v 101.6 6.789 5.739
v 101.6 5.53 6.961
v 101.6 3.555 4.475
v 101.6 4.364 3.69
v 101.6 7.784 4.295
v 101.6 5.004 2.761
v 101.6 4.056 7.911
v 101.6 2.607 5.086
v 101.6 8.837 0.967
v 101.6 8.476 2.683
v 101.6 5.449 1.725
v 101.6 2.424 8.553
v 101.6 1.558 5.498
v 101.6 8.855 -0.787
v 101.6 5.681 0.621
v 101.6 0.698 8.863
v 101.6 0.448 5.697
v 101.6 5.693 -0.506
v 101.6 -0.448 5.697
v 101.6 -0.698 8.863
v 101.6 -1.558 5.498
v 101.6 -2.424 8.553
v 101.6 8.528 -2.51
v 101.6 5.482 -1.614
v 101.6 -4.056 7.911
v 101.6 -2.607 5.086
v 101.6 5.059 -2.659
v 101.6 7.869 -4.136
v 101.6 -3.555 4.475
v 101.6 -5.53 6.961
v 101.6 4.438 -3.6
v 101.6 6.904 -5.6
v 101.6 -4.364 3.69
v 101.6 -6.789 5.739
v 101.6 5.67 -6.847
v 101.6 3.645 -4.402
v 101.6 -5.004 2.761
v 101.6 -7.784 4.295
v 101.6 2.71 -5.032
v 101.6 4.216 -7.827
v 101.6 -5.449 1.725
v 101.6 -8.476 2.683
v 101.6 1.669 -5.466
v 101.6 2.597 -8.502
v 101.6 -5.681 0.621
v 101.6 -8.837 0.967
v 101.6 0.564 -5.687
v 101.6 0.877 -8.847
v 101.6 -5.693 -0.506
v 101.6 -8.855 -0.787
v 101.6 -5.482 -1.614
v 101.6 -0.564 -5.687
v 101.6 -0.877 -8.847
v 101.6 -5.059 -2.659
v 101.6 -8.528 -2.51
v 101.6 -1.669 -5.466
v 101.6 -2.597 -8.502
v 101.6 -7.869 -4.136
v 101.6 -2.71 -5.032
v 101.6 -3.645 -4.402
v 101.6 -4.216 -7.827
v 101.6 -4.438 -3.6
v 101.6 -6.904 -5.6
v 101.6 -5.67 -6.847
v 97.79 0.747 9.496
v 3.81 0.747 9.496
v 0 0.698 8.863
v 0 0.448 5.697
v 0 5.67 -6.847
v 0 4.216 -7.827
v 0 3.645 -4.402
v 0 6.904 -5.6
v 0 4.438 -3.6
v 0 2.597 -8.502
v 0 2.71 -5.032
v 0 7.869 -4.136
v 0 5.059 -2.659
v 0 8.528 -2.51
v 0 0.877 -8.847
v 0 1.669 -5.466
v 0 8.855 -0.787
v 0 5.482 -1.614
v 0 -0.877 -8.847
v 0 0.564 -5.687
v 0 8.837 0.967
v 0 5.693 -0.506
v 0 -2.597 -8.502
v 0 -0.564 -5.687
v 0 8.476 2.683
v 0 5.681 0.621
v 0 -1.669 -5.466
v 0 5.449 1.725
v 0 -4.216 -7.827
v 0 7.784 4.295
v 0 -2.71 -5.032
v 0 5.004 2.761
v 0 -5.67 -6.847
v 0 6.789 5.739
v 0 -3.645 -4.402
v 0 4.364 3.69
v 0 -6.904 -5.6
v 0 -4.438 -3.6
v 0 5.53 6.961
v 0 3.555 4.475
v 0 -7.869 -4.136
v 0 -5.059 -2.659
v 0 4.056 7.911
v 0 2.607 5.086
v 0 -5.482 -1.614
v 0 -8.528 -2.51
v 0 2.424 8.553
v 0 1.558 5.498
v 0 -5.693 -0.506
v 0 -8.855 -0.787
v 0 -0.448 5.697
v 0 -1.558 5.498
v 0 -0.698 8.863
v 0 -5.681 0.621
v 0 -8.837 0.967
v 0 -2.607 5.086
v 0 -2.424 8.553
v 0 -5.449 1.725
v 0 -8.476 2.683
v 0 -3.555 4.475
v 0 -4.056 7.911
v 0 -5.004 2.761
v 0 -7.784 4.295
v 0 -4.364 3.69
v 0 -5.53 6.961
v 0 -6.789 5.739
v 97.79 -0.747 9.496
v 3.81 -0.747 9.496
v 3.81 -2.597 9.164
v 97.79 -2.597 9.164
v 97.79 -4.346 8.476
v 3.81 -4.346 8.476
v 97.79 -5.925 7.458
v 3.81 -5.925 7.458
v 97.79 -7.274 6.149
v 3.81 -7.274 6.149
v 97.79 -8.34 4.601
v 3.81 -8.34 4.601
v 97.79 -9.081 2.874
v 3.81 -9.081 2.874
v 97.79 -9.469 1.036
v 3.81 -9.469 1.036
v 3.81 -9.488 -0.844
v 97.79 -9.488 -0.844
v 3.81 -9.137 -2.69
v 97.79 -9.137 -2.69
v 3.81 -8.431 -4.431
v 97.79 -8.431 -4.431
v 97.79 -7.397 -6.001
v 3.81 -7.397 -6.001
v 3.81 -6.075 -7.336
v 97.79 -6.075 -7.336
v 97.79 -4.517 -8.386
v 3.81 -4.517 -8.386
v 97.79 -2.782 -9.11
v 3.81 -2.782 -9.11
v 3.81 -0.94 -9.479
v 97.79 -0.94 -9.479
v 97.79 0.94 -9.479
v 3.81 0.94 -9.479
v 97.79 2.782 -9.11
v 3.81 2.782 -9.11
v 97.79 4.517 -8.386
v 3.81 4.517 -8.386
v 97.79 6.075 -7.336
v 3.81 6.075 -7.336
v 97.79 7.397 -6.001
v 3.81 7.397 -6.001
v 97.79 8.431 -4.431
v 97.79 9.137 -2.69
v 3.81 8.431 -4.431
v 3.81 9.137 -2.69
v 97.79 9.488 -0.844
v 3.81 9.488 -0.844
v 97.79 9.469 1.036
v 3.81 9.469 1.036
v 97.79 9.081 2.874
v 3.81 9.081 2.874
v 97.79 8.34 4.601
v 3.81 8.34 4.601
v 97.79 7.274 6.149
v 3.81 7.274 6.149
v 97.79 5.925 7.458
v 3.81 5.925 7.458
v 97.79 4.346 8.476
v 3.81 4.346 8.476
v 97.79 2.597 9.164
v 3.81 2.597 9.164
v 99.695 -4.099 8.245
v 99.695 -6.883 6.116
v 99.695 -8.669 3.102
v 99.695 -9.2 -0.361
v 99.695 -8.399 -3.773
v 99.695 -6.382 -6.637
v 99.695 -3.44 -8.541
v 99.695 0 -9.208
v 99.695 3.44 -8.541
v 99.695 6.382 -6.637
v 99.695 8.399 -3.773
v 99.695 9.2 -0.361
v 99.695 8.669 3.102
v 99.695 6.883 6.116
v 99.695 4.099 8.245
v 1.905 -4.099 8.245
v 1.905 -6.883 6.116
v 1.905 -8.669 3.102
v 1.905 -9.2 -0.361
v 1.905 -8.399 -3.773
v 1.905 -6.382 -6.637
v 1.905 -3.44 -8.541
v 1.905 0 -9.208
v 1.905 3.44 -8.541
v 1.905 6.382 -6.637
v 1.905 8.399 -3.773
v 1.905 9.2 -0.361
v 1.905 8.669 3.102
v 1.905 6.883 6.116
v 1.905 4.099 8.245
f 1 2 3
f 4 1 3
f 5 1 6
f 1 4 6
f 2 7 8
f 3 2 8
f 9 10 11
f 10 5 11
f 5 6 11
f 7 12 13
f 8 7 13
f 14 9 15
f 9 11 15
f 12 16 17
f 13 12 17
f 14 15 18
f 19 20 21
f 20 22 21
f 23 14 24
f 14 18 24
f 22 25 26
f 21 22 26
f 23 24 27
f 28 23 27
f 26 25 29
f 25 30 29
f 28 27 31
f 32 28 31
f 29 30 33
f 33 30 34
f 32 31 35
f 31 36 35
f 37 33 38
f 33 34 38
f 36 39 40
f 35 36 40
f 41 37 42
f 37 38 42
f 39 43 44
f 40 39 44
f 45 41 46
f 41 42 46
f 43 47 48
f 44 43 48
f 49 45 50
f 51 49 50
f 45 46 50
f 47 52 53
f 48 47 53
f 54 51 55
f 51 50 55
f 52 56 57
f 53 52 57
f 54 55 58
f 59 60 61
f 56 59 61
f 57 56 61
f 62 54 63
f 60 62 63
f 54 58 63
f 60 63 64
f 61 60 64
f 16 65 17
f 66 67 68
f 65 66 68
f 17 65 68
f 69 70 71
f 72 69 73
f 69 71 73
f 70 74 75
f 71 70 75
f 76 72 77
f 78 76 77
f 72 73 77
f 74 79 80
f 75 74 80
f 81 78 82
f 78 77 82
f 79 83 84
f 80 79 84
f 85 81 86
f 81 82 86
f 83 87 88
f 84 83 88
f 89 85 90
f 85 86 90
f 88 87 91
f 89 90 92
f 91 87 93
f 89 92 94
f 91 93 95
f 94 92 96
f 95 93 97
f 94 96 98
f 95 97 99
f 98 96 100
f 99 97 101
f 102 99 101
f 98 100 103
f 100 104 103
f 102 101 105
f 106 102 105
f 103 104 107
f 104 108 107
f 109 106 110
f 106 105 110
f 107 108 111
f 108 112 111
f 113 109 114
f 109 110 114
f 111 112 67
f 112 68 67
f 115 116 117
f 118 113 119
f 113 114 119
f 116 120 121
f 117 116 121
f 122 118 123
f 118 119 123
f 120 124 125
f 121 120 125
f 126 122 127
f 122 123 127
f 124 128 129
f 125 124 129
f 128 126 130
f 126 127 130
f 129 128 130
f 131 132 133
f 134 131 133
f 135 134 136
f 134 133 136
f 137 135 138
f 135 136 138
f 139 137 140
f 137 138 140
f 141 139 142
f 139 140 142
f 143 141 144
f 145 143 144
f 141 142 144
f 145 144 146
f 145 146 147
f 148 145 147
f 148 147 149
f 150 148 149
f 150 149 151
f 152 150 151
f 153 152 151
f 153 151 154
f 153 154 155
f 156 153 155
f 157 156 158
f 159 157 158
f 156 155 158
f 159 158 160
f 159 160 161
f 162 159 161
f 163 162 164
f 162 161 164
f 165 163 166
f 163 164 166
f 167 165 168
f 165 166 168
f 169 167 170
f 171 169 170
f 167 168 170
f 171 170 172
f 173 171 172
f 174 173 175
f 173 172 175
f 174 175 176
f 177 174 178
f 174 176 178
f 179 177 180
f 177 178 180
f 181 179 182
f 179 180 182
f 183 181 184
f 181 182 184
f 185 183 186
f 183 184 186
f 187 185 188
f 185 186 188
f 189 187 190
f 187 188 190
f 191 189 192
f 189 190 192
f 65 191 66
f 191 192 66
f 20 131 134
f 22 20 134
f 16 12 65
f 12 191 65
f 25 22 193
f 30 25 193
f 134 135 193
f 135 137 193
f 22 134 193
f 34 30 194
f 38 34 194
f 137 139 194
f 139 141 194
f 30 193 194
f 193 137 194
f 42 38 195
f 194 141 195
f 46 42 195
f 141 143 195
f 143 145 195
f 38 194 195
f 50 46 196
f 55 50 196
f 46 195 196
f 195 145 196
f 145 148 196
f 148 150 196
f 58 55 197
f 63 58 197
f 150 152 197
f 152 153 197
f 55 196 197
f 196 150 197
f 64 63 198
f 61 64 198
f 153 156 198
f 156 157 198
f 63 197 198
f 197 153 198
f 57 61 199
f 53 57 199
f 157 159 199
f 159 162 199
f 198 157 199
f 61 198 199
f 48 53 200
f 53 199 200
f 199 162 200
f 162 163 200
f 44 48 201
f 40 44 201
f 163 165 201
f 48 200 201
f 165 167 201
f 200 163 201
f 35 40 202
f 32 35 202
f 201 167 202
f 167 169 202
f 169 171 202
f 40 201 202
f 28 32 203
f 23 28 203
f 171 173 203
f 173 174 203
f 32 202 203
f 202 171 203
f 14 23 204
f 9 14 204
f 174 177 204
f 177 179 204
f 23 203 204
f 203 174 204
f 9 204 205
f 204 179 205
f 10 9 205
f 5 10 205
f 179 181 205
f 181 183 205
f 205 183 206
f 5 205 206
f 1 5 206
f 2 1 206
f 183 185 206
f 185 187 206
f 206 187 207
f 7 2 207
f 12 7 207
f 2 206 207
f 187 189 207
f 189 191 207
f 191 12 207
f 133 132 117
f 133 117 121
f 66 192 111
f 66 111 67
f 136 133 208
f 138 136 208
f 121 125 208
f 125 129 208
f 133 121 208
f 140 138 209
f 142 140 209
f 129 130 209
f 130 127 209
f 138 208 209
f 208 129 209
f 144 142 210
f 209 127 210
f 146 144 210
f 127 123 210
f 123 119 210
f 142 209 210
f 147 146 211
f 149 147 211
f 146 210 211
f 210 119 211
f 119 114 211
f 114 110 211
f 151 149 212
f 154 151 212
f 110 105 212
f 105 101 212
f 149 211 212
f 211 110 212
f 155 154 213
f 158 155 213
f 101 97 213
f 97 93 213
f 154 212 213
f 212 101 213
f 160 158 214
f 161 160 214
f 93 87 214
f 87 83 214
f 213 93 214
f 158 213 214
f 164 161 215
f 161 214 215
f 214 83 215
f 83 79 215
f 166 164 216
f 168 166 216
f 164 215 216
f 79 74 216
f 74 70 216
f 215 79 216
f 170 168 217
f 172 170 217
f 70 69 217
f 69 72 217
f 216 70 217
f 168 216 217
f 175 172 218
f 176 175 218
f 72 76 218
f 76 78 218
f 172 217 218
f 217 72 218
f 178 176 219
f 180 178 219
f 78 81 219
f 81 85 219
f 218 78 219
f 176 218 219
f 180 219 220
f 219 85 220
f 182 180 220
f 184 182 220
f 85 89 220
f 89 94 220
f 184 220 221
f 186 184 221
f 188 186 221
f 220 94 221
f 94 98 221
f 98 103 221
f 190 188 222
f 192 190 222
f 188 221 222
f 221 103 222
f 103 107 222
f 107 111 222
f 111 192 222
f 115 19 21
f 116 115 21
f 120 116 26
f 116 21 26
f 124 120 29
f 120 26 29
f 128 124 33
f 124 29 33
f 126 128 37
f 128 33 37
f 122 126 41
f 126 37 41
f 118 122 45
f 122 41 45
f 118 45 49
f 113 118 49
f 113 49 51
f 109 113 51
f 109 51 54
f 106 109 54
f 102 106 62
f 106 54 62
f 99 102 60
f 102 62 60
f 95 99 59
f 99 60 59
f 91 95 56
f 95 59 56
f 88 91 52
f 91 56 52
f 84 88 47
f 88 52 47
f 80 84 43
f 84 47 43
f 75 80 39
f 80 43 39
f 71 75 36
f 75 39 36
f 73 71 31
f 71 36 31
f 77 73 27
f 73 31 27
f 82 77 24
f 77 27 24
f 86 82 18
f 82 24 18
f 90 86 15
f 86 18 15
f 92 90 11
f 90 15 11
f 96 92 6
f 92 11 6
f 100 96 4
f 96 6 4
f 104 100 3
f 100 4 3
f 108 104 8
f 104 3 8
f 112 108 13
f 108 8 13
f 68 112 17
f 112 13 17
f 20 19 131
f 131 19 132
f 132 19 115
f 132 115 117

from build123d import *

# Parameters (mm, degrees)
GAP_DEPTH = 103.489078686


with BuildPart() as part:
    # Sketch1 → Base-Revolve (revolve)
    with BuildSketch(Plane.XY, mode=Mode.PRIVATE) as base_revolve_sk:
        Polygon((0, 5.715), (101.6, 5.715), (101.6, 8.89), (97.79, 9.525), (3.81, 9.525), (0, 8.89), align=None)
    revolve(base_revolve_sk.sketch.rotate(Axis((-9.525, 0, 0), (1, 0, 0)), 90), axis=Axis((-9.525, 0, 0), (1, 0, 0)))

    # Sketch2 → Gap (cut, through all)
    with BuildSketch(Plane(origin=(0, 0, 0), x_dir=(0, -1, 0), z_dir=(-1, 0, 0))):
        with BuildLine():
            Line((0, 0), (0.762269345, 9.685550356))
            ThreePointArc((0.762269345, 9.685550356), (0, 9.7155), (-0.762269345, 9.685550356))
            Line((-0.762269345, 9.685550356), (0, 0))
        make_face()
    extrude(amount=-GAP_DEPTH, mode=Mode.SUBTRACT)


solid = part.part
